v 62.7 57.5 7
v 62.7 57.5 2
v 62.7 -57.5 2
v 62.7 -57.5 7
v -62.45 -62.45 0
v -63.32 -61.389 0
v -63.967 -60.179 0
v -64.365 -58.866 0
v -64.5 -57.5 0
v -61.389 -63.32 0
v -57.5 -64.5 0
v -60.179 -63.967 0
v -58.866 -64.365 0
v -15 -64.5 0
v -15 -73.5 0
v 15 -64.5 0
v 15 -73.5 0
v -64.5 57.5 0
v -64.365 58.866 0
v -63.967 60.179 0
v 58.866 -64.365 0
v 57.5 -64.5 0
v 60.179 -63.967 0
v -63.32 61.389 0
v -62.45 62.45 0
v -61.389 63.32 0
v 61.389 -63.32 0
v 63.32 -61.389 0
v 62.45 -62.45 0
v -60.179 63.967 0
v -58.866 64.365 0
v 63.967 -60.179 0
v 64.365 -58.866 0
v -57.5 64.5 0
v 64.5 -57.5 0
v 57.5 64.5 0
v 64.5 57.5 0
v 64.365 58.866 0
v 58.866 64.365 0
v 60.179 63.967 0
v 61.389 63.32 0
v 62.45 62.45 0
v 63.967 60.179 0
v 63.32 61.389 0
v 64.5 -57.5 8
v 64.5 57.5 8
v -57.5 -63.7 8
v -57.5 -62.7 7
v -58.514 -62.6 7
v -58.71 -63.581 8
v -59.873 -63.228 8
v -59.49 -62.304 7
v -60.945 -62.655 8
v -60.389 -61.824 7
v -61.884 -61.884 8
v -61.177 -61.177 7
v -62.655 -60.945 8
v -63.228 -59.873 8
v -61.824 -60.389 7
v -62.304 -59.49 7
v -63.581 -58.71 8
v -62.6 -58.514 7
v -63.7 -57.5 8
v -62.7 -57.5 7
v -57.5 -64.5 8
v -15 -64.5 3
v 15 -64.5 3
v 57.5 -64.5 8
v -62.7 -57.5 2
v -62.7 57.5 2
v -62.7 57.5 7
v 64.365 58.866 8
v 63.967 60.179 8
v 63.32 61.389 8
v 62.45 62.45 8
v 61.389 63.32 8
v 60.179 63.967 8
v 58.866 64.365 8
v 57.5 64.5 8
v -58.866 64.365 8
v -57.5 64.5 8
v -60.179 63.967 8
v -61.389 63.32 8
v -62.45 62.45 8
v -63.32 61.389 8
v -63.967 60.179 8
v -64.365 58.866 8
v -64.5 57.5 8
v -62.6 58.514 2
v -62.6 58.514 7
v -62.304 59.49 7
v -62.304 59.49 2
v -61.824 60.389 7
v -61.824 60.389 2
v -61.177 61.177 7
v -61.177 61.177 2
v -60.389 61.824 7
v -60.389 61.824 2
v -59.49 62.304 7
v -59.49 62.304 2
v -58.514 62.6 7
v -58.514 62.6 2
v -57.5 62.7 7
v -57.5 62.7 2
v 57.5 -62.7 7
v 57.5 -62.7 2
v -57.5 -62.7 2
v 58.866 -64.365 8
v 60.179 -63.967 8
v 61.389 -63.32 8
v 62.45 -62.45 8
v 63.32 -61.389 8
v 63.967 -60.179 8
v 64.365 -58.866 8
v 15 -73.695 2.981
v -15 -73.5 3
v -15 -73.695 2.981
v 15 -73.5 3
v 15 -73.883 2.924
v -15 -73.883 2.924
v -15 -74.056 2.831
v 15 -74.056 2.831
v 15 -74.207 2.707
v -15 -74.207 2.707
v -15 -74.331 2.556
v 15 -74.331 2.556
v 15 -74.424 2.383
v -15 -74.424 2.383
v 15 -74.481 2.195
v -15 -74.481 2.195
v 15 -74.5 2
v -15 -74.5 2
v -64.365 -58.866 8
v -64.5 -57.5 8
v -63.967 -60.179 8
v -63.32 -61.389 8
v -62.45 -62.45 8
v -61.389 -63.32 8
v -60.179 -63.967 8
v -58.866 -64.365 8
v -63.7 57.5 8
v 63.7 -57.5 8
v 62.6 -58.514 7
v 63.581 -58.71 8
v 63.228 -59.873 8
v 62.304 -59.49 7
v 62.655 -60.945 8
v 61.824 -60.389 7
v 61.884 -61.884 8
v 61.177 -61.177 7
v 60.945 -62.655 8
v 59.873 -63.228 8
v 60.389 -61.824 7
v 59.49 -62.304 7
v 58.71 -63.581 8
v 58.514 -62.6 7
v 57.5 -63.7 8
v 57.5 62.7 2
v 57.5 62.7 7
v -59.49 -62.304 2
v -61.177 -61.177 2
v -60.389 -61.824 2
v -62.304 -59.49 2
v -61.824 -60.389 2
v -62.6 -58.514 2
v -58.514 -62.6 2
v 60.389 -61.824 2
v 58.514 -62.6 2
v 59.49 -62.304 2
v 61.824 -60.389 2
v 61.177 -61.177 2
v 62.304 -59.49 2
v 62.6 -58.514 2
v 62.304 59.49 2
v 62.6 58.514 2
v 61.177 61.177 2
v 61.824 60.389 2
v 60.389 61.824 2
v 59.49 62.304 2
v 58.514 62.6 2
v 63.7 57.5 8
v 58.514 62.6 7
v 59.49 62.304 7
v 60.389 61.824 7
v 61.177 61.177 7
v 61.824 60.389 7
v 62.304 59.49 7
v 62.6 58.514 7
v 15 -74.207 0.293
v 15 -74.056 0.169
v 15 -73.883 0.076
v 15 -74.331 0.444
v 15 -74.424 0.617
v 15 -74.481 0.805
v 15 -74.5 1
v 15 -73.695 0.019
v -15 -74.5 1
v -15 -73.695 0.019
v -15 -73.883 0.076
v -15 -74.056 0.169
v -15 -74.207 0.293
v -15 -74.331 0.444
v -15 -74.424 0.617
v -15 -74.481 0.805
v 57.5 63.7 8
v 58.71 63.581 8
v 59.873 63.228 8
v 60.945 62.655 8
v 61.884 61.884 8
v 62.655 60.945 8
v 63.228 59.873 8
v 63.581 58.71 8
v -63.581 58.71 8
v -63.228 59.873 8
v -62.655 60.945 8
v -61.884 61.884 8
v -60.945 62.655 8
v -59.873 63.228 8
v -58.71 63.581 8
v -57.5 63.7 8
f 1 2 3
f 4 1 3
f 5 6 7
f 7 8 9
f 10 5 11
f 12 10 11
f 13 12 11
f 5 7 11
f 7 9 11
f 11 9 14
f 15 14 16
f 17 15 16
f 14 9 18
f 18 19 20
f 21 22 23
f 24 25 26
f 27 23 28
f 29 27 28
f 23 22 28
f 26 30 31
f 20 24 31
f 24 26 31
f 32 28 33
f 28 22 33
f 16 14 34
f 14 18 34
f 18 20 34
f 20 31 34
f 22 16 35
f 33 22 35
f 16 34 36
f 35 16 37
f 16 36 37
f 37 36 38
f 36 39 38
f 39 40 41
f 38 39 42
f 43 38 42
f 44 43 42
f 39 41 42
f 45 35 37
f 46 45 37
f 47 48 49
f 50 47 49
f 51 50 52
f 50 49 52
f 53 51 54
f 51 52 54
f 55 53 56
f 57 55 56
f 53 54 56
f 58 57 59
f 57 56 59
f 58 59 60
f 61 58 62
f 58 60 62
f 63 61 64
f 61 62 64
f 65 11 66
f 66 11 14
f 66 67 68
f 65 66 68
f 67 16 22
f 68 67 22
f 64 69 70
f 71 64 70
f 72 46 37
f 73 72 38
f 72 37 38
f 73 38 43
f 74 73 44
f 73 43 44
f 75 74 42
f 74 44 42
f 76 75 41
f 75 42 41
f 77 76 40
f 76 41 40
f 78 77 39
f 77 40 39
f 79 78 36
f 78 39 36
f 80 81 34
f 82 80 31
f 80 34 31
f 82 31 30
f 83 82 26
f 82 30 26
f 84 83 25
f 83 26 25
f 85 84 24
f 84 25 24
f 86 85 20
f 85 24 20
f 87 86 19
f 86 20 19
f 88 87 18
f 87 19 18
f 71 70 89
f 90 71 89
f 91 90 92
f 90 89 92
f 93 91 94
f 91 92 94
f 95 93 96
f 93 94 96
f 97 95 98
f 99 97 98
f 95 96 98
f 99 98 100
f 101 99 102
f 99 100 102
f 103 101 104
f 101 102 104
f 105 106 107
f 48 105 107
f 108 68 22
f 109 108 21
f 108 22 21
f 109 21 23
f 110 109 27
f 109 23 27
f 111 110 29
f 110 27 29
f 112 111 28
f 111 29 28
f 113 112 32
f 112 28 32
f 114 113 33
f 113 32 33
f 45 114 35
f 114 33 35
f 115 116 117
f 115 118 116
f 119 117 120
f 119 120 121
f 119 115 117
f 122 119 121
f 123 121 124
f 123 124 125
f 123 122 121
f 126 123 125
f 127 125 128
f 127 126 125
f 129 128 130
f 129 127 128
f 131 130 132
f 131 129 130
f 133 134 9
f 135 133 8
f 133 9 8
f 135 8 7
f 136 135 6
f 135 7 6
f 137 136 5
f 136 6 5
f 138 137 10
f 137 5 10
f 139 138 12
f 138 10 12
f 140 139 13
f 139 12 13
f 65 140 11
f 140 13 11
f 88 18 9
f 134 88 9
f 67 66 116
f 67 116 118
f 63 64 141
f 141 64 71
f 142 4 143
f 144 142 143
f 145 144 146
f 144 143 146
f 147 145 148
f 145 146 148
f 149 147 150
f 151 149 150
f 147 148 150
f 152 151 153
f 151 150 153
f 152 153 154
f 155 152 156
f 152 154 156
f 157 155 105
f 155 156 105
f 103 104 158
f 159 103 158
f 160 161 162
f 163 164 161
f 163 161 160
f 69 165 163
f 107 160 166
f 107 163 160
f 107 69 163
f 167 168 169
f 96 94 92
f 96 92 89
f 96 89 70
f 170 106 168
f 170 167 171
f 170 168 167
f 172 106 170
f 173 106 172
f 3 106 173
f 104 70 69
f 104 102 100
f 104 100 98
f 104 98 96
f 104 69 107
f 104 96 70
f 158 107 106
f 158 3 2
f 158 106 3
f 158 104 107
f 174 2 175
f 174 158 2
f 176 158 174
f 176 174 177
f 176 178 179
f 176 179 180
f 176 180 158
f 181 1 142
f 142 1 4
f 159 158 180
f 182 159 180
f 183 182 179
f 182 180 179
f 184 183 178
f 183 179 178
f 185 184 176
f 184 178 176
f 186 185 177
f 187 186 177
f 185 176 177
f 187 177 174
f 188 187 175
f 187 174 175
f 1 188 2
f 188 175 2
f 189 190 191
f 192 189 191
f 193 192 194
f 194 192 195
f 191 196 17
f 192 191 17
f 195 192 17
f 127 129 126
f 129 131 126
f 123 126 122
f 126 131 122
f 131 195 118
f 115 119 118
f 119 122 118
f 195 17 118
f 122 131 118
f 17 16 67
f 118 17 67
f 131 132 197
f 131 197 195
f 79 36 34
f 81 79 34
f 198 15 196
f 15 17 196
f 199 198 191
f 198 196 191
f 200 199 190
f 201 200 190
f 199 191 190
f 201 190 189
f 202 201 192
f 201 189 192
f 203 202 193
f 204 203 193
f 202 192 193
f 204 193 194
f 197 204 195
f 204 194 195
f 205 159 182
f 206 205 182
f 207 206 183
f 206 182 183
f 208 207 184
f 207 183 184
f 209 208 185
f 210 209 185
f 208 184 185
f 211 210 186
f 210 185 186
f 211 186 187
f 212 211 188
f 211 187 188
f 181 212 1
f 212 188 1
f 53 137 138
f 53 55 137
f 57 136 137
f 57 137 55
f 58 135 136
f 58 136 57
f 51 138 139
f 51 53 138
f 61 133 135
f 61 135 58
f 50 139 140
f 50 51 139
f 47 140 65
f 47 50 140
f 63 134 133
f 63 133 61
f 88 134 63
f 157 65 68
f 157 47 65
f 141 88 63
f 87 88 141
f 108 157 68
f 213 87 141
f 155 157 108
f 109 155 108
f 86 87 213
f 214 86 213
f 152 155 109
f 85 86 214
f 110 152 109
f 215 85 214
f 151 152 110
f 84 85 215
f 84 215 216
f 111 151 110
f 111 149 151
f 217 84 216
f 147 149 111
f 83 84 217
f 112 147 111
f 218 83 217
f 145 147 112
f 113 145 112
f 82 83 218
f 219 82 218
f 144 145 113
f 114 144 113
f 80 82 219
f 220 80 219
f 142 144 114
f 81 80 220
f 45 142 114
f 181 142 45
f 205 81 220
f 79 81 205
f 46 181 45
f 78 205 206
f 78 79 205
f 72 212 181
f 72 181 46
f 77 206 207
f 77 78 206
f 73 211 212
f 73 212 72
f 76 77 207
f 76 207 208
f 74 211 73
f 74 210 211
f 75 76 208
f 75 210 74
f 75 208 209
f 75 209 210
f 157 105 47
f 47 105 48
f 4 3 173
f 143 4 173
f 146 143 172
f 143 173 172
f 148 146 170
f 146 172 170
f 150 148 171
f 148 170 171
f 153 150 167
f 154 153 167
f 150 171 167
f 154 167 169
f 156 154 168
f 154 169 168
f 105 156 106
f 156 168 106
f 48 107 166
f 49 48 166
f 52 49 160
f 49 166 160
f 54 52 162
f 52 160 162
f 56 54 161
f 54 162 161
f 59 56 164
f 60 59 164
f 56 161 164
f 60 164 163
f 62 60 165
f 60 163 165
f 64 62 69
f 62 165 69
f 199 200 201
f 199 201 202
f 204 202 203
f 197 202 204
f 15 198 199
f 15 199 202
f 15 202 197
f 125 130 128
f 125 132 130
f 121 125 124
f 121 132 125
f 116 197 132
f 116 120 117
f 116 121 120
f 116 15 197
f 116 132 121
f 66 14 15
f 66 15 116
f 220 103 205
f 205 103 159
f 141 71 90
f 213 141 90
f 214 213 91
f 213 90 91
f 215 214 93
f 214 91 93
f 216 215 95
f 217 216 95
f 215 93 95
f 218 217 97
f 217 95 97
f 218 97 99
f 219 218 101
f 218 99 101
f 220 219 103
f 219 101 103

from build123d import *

# Parameters (mm, degrees)
F1_DEPTH = 8
F2_DEPTH = 2
F3_W     = 30
F3_H     = 3
F4_DEPTH = 10
F5_R     = 1
F6_SIZE  = 1


with BuildPart() as f1:
    # F0 (on Top) → F1 (new body)
    with BuildSketch(Plane.XY):
        with BuildLine():
            Line((-57.5, -64.5), (57.5, -64.5))
            ThreePointArc((57.5, -64.5), (62.449747, -62.449747), (64.5, -57.5))
            Line((64.5, -57.5), (64.5, 57.5))
            ThreePointArc((64.5, 57.5), (62.449747, 62.449747), (57.5, 64.5))
            Line((57.5, 64.5), (-57.5, 64.5))
            ThreePointArc((-57.5, 64.5), (-62.449747, 62.449747), (-64.5, 57.5))
            Line((-64.5, 57.5), (-64.5, -57.5))
            ThreePointArc((-64.5, -57.5), (-62.449747, -62.449747), (-57.5, -64.5))
        make_face()
        with BuildLine():
            ThreePointArc((-57.5, -62.7), (-61.176955, -61.176955), (-62.7, -57.5))
            Line((-62.7, -57.5), (-62.7, 57.5))
            ThreePointArc((-62.7, 57.5), (-61.176955, 61.176955), (-57.5, 62.7))
            Line((-57.5, 62.7), (57.5, 62.7))
            ThreePointArc((57.5, 62.7), (61.176955, 61.176955), (62.7, 57.5))
            Line((62.7, 57.5), (62.7, -57.5))
            ThreePointArc((62.7, -57.5), (61.176955, -61.176955), (57.5, -62.7))
            Line((57.5, -62.7), (-57.5, -62.7))
        make_face(mode=Mode.SUBTRACT)
    extrude(amount=F1_DEPTH)

    # F0 (on Top) → F2 (join)
    with BuildSketch(Plane.XY):
        with BuildLine():
            Line((-62.7, 57.5), (-62.7, -57.5))
            ThreePointArc((-62.7, -57.5), (-61.176955, -61.176955), (-57.5, -62.7))
            Line((-57.5, -62.7), (57.5, -62.7))
            ThreePointArc((57.5, -62.7), (61.176955, -61.176955), (62.7, -57.5))
            Line((62.7, -57.5), (62.7, 57.5))
            ThreePointArc((62.7, 57.5), (61.176955, 61.176955), (57.5, 62.7))
            Line((57.5, 62.7), (-57.5, 62.7))
            ThreePointArc((-57.5, 62.7), (-61.176955, 61.176955), (-62.7, 57.5))
        make_face()
    extrude(amount=F2_DEPTH)

    # F3 (on face) → F4 (join)
    with BuildSketch(Plane.XZ.offset(64.5)):
        with Locations((0, 1.5)):
            Rectangle(F3_W, F3_H)
    extrude(amount=F4_DEPTH)

    # F5
    f5_edges = [f1.edges().sort_by_distance(p)[0] for p in [
        (0, -74.5, 0),
        (0, -74.5, 3),
    ]]
    fillet(f5_edges, radius=F5_R)

    # F6
    f6_edges = [f1.edges().sort_by_distance(p)[0] for p in [
        (0, 62.7, 8),
        (-61.176955, 61.176955, 8),
        (-62.7, 0, 8),
        (-61.176955, -61.176955, 8),
        (0, -62.7, 8),
        (61.176955, -61.176955, 8),
        (62.7, 0, 8),
        (61.176955, 61.176955, 8),
    ]]
    chamfer(f6_edges, length=F6_SIZE)


solid = f1.part
